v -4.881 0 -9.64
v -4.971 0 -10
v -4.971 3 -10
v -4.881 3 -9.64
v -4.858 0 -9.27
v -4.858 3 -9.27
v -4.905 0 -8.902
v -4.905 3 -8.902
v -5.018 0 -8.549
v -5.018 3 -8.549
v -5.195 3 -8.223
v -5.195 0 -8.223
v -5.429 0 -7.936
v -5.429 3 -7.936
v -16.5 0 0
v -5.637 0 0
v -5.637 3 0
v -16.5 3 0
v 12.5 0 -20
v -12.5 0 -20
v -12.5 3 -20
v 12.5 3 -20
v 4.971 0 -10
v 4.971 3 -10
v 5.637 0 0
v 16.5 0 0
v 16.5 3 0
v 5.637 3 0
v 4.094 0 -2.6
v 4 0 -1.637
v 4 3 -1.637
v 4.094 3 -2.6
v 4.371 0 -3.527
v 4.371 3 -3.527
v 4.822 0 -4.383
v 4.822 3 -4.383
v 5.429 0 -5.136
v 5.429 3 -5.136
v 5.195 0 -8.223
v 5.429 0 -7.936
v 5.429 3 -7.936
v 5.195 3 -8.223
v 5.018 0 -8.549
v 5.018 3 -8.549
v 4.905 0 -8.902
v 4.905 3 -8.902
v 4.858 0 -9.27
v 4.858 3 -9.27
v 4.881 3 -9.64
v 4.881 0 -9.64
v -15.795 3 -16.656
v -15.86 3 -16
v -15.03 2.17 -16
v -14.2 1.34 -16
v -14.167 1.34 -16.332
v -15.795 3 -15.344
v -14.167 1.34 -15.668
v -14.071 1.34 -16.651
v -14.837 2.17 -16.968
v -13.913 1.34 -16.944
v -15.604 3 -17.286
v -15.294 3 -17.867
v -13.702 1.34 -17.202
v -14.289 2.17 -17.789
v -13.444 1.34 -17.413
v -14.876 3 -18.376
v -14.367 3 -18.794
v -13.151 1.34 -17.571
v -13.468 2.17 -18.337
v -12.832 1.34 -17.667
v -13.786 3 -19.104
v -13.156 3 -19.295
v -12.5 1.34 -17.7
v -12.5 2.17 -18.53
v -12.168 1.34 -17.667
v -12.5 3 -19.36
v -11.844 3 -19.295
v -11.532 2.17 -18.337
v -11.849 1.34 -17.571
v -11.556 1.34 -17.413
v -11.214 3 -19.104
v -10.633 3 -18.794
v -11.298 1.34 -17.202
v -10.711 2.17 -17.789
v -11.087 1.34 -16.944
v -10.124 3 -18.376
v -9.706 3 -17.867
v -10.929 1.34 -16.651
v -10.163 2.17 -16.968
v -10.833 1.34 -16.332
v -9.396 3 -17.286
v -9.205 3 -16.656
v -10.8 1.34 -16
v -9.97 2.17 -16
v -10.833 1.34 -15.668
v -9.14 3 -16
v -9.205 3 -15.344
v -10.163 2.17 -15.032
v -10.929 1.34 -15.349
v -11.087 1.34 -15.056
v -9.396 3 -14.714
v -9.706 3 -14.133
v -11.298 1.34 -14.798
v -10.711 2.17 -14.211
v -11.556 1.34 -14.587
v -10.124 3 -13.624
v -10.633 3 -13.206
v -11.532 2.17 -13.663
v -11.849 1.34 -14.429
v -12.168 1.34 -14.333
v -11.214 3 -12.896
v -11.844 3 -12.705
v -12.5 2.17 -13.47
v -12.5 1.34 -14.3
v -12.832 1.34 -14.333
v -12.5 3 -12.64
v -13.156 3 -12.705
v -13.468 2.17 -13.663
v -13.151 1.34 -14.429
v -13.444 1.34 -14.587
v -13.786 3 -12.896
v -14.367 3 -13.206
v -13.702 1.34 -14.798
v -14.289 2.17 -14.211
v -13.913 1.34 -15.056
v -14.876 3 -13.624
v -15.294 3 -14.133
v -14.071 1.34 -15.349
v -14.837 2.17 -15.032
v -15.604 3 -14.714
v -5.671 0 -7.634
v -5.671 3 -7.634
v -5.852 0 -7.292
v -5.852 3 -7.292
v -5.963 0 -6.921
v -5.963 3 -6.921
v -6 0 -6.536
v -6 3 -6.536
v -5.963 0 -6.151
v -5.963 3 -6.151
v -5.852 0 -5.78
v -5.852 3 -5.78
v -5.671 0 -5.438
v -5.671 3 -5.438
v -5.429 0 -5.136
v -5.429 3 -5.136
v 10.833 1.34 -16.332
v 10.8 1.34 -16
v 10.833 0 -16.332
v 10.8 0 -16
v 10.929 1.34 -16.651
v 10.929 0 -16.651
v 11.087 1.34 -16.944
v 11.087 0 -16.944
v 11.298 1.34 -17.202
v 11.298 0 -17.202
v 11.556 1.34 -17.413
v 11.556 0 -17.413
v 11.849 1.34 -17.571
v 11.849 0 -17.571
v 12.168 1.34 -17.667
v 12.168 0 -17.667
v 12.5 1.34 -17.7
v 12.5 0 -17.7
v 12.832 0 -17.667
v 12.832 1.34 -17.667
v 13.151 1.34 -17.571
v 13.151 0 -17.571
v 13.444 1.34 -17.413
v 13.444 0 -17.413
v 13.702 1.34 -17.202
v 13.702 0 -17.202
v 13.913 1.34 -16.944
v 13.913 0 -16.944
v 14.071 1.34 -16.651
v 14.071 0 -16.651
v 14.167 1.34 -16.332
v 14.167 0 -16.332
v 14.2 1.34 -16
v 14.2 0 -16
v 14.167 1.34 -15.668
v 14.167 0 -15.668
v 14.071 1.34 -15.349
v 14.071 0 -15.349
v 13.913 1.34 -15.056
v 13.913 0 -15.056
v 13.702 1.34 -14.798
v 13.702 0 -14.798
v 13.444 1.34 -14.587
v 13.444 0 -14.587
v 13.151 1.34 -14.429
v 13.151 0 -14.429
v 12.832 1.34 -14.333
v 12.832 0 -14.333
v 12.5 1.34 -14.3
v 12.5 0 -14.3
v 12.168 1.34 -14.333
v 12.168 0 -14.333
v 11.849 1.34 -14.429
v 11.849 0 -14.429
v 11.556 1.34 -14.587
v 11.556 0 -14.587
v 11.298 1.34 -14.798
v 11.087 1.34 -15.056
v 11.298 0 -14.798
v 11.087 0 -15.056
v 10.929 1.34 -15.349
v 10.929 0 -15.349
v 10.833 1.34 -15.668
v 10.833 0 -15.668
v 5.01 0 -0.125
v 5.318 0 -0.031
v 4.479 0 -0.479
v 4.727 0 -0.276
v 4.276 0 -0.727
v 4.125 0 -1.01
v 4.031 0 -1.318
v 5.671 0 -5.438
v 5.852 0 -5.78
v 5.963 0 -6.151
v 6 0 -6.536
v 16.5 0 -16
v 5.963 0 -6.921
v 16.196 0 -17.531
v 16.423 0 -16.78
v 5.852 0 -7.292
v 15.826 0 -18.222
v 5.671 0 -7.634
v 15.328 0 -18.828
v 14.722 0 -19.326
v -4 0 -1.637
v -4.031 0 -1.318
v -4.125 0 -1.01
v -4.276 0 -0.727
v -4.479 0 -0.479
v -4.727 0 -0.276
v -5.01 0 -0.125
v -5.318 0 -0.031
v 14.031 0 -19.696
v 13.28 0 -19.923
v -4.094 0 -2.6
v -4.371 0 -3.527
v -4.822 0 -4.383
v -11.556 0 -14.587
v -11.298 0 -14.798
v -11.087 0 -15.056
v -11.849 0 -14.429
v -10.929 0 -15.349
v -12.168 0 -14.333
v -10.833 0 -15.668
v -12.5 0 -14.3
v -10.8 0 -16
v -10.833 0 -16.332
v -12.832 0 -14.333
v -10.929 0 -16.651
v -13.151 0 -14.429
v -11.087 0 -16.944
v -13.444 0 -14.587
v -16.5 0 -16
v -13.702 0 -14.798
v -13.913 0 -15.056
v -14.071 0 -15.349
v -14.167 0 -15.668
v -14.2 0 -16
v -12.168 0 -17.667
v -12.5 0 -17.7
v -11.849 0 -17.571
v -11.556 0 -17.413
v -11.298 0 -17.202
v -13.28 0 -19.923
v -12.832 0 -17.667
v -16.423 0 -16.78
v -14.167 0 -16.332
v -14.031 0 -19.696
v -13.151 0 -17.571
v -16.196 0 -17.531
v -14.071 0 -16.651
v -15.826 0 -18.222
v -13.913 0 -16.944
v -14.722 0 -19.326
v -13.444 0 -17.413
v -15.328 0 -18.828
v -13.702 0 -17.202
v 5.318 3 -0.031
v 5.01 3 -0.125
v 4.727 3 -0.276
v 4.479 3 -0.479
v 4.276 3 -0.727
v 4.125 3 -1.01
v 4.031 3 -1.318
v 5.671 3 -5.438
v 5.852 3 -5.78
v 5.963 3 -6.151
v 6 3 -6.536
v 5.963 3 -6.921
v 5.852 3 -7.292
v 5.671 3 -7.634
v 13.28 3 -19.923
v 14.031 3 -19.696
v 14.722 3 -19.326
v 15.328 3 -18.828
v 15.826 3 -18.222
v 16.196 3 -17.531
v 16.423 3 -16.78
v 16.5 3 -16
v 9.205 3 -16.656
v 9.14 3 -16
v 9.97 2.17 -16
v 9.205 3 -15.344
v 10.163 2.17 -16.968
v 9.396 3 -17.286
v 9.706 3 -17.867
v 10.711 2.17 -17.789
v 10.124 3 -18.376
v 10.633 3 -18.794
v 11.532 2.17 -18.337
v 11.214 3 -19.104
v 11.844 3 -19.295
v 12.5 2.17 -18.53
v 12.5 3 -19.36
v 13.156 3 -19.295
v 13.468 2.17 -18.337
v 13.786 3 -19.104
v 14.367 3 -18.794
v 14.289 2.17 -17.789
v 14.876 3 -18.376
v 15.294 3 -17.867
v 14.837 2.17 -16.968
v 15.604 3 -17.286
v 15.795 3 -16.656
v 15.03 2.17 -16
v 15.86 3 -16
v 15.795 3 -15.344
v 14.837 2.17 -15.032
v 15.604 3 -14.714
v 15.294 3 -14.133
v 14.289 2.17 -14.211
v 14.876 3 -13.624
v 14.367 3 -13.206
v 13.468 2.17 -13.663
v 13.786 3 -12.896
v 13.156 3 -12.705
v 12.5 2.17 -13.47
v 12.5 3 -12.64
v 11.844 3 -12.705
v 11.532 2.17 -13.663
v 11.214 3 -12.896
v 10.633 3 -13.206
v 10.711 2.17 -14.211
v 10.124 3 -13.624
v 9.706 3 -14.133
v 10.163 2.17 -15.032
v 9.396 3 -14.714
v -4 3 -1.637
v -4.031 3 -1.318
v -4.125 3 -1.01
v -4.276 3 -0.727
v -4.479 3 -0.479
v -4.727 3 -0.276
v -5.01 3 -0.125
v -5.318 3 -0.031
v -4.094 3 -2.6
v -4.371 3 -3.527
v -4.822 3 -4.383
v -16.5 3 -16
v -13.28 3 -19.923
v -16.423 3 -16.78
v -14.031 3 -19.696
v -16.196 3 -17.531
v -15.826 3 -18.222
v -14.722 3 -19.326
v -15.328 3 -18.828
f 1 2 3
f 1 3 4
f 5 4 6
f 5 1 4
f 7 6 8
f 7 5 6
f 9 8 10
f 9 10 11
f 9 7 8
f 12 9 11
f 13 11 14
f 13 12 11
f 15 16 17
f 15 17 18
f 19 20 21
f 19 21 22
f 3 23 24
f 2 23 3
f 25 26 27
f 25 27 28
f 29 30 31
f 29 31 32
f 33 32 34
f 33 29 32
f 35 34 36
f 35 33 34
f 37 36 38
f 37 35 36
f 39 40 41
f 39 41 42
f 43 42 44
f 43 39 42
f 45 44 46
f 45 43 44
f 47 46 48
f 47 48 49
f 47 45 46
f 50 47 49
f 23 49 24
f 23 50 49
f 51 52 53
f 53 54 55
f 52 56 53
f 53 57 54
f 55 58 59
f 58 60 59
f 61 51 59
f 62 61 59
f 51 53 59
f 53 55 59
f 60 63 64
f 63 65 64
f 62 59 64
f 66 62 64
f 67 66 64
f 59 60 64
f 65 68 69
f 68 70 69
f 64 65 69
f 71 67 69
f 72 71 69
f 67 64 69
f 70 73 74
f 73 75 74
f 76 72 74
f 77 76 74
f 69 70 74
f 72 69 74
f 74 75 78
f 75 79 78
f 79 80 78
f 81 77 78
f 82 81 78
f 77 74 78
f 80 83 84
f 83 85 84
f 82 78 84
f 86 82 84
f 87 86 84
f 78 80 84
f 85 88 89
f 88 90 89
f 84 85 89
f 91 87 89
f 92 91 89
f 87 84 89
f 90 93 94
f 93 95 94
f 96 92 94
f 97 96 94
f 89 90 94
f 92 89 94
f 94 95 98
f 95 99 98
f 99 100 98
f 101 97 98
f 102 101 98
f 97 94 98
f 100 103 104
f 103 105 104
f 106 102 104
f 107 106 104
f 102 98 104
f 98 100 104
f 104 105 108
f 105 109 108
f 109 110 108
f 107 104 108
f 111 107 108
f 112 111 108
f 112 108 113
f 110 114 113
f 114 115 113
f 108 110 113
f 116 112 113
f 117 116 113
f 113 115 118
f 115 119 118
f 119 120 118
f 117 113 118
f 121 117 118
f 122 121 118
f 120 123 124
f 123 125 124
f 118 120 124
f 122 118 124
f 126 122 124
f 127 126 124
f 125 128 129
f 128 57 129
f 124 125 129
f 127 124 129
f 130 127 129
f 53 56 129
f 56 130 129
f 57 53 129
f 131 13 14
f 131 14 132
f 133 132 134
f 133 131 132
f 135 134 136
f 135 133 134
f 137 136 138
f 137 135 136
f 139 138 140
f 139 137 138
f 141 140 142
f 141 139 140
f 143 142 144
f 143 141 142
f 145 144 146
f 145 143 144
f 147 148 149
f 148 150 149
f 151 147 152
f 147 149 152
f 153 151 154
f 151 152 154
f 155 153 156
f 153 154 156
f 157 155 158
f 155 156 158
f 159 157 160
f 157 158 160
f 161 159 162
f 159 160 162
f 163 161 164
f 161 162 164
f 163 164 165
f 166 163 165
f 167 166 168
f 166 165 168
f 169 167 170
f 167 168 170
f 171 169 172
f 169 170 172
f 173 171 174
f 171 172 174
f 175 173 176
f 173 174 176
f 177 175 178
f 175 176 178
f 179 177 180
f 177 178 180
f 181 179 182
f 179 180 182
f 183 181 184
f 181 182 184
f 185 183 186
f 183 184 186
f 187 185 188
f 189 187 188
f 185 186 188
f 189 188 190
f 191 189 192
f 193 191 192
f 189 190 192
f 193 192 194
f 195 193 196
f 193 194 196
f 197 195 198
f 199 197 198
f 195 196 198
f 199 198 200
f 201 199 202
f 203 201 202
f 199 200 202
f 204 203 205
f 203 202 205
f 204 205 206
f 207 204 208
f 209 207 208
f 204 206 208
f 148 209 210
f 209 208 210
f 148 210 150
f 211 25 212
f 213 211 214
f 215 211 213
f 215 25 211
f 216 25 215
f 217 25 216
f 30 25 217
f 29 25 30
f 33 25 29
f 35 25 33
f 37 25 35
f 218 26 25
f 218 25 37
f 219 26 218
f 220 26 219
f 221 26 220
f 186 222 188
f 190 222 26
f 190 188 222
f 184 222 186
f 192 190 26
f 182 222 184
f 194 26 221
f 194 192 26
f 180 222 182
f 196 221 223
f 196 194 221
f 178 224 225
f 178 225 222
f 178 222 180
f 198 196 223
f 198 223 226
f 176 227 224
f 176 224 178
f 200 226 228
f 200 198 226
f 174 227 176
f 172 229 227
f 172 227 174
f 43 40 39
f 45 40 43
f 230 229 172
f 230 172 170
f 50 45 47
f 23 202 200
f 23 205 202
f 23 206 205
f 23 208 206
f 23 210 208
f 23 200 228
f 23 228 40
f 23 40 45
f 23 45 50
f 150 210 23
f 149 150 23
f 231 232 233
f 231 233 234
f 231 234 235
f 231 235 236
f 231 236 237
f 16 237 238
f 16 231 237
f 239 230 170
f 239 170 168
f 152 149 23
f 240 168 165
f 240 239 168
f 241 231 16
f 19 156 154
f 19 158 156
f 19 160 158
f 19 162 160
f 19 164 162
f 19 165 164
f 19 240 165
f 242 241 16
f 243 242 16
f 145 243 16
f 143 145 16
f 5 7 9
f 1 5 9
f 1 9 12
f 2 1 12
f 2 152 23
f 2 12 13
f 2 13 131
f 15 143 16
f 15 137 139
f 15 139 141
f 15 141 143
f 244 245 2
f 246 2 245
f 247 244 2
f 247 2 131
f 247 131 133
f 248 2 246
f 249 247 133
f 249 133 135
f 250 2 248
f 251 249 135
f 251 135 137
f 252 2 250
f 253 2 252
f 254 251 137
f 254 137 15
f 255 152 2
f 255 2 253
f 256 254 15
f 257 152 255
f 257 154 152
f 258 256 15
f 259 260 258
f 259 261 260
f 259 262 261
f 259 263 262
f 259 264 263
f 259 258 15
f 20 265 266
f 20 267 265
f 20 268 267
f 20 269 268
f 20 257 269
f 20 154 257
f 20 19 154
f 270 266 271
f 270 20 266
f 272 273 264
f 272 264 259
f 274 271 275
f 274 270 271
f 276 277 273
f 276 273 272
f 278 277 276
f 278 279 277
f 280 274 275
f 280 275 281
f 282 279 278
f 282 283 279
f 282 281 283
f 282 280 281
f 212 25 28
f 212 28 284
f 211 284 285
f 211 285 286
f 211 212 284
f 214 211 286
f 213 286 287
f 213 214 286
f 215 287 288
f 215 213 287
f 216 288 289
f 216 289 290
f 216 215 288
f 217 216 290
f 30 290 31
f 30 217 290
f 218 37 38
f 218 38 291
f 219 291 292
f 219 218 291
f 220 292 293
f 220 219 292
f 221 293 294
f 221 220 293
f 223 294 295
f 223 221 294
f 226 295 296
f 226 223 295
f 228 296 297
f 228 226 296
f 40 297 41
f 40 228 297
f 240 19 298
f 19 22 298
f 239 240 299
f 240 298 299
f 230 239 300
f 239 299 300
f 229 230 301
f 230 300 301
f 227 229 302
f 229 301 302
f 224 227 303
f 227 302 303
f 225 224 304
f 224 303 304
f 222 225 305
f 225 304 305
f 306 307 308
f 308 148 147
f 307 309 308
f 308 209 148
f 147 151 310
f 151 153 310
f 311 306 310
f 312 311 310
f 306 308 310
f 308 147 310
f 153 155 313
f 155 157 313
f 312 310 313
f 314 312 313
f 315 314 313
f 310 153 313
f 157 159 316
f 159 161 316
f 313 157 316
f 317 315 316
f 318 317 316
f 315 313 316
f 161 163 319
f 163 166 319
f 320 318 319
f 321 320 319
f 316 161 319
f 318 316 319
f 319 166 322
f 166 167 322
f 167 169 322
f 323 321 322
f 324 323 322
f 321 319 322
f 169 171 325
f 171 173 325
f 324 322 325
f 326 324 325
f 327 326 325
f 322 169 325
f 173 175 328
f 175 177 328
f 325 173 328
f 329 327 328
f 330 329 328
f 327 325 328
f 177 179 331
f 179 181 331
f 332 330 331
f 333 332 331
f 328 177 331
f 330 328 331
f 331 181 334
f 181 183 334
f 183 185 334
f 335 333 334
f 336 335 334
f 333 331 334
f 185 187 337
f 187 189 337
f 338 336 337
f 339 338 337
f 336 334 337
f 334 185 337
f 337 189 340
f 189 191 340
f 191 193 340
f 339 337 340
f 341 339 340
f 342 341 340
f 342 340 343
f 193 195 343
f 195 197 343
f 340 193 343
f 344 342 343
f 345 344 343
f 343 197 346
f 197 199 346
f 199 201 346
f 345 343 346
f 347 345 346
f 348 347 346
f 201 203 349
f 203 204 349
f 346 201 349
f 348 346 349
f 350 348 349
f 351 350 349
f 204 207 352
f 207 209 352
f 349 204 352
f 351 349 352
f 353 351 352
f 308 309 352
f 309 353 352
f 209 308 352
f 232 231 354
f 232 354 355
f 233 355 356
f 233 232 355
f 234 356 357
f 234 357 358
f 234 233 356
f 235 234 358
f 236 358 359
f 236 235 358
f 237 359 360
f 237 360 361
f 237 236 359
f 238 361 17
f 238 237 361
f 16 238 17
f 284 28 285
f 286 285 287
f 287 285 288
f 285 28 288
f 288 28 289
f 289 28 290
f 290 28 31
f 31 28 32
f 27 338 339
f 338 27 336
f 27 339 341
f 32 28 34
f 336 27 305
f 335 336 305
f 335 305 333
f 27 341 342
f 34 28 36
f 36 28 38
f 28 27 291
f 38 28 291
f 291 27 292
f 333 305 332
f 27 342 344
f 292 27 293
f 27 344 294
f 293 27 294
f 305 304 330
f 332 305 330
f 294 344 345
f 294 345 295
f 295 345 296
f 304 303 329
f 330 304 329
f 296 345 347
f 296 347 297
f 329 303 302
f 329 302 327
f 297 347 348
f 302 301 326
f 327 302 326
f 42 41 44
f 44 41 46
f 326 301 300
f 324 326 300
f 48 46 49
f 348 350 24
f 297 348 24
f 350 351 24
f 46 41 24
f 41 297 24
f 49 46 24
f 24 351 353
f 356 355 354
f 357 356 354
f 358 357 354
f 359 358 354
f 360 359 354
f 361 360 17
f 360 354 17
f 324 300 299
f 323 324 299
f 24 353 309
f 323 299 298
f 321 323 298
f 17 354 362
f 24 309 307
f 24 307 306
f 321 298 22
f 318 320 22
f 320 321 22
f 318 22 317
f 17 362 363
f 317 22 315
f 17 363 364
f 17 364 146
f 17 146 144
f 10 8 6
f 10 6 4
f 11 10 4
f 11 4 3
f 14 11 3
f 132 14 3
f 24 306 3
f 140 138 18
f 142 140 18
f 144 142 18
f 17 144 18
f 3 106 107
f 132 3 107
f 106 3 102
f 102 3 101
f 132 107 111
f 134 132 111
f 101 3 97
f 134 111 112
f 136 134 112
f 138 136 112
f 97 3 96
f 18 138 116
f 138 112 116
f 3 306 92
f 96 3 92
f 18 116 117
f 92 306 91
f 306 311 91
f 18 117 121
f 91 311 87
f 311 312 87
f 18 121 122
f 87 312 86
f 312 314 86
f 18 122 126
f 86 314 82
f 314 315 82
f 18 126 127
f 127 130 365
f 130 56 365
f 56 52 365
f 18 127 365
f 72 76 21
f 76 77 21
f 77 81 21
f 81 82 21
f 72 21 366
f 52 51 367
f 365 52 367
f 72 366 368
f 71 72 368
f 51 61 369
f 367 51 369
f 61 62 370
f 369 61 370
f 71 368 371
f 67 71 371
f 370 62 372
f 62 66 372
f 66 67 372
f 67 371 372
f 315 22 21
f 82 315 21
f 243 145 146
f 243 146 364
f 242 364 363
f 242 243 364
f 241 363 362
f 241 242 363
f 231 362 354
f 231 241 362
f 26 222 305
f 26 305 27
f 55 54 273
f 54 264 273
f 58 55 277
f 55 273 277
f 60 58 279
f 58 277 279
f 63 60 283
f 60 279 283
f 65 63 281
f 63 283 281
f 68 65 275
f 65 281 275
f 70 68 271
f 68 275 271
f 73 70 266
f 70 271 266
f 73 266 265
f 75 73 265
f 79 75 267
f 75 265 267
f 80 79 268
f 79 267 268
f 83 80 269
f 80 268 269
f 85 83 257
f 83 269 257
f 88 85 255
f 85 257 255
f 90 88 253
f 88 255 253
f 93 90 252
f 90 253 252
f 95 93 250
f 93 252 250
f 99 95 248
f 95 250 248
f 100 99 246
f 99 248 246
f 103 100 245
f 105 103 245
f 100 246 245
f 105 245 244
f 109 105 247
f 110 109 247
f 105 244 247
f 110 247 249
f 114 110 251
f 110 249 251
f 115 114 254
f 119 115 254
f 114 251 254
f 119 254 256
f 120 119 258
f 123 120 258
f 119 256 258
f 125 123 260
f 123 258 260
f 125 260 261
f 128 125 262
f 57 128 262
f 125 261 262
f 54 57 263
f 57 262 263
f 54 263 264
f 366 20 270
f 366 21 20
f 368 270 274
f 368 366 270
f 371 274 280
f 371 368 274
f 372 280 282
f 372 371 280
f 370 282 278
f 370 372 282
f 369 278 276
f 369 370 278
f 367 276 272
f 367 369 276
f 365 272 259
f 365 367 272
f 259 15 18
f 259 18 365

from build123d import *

# Parameters (mm, degrees)
BOSS_EXTRUDE1_DEPTH           = 3
CSK_FOR_M3_SFHCS1_D           = 3.4
CSK_FOR_M3_SFHCS1_DEPTH       = 10
CSK_FOR_M3_SFHCS1_CSINK_D     = 6.72
CSK_FOR_M3_SFHCS1_CSINK_ANGLE = 90
CSK_FOR_M3_SFHCS1_TIP         = 1.021463052
FILLET1_R                     = 4


with BuildPart() as part:
    # Sketch1 → Boss-Extrude1 (new body)
    with BuildSketch(Plane(origin=(0, 0, 0), x_dir=(1, 0, 0), z_dir=(0, 1, 0))):
        with BuildLine():
            Line((-16.5, 20), (16.5, 20))
            Line((16.5, 20), (16.5, 0))
            Line((16.5, 0), (5.636918899, 0))
            ThreePointArc((5.636918899, 0), (4.479442445, 0.479442445), (4, 1.636918899))
            ThreePointArc((4, 1.636918899), (4.370899501, 3.526741264), (5.428571429, 5.13618996))
            ThreePointArc((5.428571429, 5.13618996), (6, 6.535898385), (5.428571429, 7.935606809))
            ThreePointArc((5.428571429, 7.935606809), (4.904567081, 8.902362767), (4.970825238, 10))
            Line((4.970825238, 10), (-4.970825238, 10))
            ThreePointArc((-4.970825238, 10), (-4.904567081, 8.902362767), (-5.428571429, 7.935606809))
            ThreePointArc((-5.428571429, 7.935606809), (-6, 6.535898385), (-5.428571429, 5.13618996))
            ThreePointArc((-5.428571429, 5.13618996), (-4.370899501, 3.526741264), (-4, 1.636918899))
            ThreePointArc((-4, 1.636918899), (-4.479442445, 0.479442445), (-5.636918899, 0))
            Line((-5.636918899, 0), (-16.5, 0))
            Line((-16.5, 0), (-16.5, 20))
        make_face()
    extrude(amount=BOSS_EXTRUDE1_DEPTH)

    # CSK for M3 SFHCS1
    with Locations(Plane(origin=(0, 3, 0), x_dir=(1, 0, 0), z_dir=(0, 1, 0))):
        with Locations((12.5, 16), (-12.5, 16)):
            CounterSinkHole(CSK_FOR_M3_SFHCS1_D / 2, CSK_FOR_M3_SFHCS1_CSINK_D / 2, depth=CSK_FOR_M3_SFHCS1_DEPTH, counter_sink_angle=CSK_FOR_M3_SFHCS1_CSINK_ANGLE)
            with Locations((0, 0, -(CSK_FOR_M3_SFHCS1_DEPTH + CSK_FOR_M3_SFHCS1_TIP / 2))):  # 118° drill point
                Cone(0, CSK_FOR_M3_SFHCS1_D / 2, CSK_FOR_M3_SFHCS1_TIP, mode=Mode.SUBTRACT)

    # Fillet1
    fillet1_edges = [part.edges().sort_by_distance(p)[0] for p in [
        (-16.5, 1.5, -20),
        (16.5, 1.5, -20),
    ]]
    fillet(fillet1_edges, radius=FILLET1_R)


solid = part.part
